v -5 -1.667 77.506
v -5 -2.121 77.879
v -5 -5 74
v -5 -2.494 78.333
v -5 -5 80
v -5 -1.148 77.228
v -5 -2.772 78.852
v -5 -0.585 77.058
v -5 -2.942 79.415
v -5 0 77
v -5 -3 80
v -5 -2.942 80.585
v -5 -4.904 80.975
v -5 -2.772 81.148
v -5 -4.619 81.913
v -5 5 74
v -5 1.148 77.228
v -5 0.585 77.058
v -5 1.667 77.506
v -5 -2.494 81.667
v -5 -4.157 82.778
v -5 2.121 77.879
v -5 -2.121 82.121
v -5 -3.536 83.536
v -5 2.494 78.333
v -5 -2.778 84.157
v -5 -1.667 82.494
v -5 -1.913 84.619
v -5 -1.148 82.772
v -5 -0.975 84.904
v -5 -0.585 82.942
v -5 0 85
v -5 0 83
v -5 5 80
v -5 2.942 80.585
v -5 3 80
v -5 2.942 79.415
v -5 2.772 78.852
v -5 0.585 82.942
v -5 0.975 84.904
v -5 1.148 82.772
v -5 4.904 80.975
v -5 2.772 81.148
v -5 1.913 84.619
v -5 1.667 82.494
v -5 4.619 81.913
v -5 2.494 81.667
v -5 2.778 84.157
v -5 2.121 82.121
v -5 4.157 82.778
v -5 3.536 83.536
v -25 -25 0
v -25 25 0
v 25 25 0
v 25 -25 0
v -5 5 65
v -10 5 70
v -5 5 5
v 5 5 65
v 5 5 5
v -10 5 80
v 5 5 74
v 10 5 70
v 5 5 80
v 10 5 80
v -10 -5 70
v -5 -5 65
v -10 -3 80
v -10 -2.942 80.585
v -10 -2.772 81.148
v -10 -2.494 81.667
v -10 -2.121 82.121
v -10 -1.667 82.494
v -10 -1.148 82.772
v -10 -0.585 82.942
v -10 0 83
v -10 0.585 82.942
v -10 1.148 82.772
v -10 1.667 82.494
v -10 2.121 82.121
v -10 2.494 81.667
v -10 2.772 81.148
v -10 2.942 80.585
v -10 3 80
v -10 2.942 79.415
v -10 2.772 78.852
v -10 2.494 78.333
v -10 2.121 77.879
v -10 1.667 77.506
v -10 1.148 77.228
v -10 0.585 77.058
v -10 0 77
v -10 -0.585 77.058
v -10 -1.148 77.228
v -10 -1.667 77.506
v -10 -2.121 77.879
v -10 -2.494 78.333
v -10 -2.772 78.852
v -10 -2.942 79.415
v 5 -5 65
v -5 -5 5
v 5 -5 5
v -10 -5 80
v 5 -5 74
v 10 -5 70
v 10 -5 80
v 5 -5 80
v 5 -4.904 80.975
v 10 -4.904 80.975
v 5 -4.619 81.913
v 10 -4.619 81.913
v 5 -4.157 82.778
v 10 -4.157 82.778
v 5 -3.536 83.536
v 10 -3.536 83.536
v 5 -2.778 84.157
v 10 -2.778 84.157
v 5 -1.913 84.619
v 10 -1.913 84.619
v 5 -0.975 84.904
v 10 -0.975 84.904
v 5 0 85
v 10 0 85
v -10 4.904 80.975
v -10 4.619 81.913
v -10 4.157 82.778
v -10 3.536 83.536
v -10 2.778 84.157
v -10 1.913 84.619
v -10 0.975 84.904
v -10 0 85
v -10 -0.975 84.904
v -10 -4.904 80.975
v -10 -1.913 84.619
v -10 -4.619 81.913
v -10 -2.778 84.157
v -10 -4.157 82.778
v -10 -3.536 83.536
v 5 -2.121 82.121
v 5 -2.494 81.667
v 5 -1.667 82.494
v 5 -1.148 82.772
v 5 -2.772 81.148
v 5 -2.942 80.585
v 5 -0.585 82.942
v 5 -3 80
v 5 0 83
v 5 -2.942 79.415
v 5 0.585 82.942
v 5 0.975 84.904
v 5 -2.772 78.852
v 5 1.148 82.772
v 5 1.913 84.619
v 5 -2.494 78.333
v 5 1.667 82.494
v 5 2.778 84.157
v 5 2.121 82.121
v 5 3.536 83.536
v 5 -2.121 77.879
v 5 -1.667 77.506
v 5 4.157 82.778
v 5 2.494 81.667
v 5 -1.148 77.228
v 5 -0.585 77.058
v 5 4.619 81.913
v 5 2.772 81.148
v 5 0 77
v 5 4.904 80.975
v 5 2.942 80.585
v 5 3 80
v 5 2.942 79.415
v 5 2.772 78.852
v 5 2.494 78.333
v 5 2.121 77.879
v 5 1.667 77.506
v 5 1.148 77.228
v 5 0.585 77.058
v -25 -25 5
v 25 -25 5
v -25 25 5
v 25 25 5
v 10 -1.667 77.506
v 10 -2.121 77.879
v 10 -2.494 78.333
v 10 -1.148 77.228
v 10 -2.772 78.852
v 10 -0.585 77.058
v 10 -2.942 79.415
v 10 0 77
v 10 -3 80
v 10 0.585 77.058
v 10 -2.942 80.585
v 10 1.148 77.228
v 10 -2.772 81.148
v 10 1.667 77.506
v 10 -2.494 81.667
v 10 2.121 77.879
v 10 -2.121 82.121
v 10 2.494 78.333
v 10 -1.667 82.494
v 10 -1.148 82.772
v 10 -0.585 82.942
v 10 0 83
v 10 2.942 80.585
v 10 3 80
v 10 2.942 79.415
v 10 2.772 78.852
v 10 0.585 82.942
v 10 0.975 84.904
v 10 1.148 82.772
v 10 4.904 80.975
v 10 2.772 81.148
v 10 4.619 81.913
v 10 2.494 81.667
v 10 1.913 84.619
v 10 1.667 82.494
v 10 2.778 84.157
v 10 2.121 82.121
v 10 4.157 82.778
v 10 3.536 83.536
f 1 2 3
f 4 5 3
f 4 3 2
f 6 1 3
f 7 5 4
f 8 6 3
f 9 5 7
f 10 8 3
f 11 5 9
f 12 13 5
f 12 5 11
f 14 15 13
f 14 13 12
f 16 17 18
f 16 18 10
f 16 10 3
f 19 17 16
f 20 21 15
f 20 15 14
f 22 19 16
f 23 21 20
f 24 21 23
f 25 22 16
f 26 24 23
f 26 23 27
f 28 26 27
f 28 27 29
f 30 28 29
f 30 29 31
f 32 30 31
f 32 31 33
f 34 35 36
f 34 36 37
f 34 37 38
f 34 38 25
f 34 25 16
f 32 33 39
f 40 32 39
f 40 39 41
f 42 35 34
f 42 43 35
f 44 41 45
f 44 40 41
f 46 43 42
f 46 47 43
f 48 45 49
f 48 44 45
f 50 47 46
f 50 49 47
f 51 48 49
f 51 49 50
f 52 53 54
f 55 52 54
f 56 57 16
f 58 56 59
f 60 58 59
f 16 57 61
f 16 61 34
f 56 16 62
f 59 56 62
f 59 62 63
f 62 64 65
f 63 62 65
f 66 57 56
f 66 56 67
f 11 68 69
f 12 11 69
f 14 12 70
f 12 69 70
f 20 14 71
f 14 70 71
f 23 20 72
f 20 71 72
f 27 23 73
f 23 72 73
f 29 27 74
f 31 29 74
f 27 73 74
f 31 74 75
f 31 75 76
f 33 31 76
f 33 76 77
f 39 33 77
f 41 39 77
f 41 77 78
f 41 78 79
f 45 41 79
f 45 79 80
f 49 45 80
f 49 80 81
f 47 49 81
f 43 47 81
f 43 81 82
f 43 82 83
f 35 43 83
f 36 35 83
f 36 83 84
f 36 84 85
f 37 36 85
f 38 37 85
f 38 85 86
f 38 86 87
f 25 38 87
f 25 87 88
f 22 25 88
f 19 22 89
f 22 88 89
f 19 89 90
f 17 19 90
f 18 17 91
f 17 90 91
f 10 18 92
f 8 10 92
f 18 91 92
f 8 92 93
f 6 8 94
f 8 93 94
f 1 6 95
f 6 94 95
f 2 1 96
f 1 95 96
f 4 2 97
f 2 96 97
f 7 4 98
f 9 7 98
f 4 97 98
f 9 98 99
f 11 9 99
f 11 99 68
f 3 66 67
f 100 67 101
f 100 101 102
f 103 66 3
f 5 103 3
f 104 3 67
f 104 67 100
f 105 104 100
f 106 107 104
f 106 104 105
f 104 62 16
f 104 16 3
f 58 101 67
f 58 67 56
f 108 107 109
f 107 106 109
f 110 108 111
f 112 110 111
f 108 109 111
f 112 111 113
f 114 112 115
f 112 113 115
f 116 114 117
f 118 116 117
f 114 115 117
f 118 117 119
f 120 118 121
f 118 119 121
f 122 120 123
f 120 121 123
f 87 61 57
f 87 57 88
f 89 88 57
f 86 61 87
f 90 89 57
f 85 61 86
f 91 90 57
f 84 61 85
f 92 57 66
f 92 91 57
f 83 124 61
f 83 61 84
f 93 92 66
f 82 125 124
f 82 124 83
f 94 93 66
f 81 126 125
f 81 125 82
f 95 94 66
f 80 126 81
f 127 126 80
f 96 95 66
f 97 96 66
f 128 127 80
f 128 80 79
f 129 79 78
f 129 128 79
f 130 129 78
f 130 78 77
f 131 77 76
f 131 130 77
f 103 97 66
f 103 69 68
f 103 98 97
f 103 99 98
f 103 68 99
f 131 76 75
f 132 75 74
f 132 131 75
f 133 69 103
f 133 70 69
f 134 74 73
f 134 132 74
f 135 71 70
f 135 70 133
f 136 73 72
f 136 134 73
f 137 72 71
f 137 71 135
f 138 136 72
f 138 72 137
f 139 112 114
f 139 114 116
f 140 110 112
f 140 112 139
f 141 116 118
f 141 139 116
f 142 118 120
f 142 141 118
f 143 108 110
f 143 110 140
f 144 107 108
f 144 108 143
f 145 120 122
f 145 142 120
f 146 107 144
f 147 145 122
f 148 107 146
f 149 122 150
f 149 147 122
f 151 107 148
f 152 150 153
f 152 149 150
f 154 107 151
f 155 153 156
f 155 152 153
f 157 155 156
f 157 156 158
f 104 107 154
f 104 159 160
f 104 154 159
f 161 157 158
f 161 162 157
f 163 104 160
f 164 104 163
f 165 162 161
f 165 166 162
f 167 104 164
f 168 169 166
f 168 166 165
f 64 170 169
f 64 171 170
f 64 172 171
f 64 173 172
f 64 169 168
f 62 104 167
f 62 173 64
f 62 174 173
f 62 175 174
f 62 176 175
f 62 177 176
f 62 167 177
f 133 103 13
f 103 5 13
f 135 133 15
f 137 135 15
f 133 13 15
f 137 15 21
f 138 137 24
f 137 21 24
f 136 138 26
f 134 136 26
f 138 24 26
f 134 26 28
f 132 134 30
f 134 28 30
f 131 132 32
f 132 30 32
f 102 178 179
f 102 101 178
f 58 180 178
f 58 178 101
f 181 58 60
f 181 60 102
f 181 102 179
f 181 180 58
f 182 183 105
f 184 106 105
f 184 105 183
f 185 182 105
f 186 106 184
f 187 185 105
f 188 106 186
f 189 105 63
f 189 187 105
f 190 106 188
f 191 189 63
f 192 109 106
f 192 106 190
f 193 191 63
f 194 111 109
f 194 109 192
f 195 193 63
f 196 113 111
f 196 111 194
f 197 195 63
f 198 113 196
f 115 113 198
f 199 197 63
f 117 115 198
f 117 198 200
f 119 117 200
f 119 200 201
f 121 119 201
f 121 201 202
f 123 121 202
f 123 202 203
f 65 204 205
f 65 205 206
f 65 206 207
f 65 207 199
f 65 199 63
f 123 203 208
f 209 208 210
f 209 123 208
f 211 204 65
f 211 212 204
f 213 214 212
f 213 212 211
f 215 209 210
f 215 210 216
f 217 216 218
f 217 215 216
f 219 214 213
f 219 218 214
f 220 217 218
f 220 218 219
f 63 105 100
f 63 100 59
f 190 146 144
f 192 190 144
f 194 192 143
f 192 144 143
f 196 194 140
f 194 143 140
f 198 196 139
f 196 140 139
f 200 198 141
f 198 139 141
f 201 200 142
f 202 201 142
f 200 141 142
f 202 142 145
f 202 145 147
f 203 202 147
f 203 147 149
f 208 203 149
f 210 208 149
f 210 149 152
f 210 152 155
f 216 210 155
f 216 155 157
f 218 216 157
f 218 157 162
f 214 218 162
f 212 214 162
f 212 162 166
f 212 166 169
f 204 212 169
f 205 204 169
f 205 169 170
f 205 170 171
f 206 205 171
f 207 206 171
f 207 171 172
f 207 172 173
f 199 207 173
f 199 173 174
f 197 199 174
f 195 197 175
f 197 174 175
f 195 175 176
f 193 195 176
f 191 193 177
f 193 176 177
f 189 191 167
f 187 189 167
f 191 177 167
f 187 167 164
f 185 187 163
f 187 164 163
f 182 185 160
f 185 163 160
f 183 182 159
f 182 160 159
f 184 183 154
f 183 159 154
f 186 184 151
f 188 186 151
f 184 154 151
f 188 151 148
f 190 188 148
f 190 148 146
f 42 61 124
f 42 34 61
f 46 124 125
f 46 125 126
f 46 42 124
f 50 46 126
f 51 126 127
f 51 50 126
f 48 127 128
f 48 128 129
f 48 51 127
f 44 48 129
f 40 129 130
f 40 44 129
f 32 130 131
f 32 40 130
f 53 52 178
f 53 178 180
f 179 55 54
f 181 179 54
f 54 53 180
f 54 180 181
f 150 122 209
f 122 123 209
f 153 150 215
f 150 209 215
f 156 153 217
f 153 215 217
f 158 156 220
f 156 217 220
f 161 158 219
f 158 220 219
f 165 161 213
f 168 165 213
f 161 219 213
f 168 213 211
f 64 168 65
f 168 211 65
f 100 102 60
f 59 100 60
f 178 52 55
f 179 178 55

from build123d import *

# Parameters (mm, degrees)
F0_W      = 50
F0_H      = 50
F0_W_2    = 10
F0_H_2    = 10
F1_DEPTH  = 5
F2_DEPTH  = 75
F3_W      = 10
F3_H      = 5
F4_DEPTH  = 5
F5_W      = 10
F5_H      = 5
F6_DEPTH  = 5
F7_W      = 5
F7_H      = 10
F8_DEPTH  = 10
F10_D     = 6
F10_DEPTH = 20.001
F12_D     = 6
F13_R     = 4.99999
F14_DEPTH = 1
F15_DEPTH = 5
F16_SIZE  = 4.99999


# Not quite as in the source:
# - a fillet or chamfer is up to 0.001 mm smaller than in the source, because OpenCascade refuses the exact size


with BuildPart() as f1:
    # F0 (on Top) → F1 (new body)
    with BuildSketch(Plane.XY):
        Rectangle(F0_W, F0_H)
        Rectangle(F0_W_2, F0_H_2, mode=Mode.SUBTRACT)
    extrude(amount=F1_DEPTH)

    # F0 (on Top) → F2 (join)
    with BuildSketch(Plane.XY):
        Rectangle(F0_W_2, F0_H_2)
    extrude(amount=F2_DEPTH)

    # F3 (on face) → F4 (join)
    with BuildSketch(Plane.YZ.offset(5)):
        with Locations((0, 72.5)):
            Rectangle(F3_W, F3_H)
    extrude(amount=F4_DEPTH)

    # F5 (on face) → F6 (join)
    with BuildSketch(Plane(origin=(-5, 0, 0), x_dir=(0, -1, 0), z_dir=(-1, 0, 0))):
        with Locations((0, 72.5)):
            Rectangle(F5_W, F5_H)
    extrude(amount=F6_DEPTH)

    # F7 (on face) → F8 (join)
    with BuildSketch(Plane.XY.offset(75)):
        with Locations((7.5, 0)):
            Rectangle(F7_W, F7_H)
        with Locations((-7.5, 0)):
            Rectangle(F7_W, F7_H)
    extrude(amount=F8_DEPTH)

    # F10 (through all, one way)
    with BuildSketch(Plane(origin=(5, 0, 0), x_dir=(0, -1, 0), z_dir=(-1, 0, 0))):
        with Locations((0, 80)):
            Circle(F10_D / 2)
    extrude(amount=-F10_DEPTH, mode=Mode.SUBTRACT)

    # F12 (through all)
    with Locations(Plane.YZ.offset(-5)):
        with Locations((0, 80)):
            Hole(F12_D / 2)

    # F13 (radius 5 in the source; OpenCascade refuses exactly that, so slightly less here)
    f13_edges = [f1.edges().sort_by_distance(p)[0] for p in [
        (-7.5, -5, 85),
        (7.5, -5, 85),
        (7.5, 5, 85),
        (-7.5, 5, 85),
    ]]
    fillet(f13_edges, radius=F13_R)

    # F14 (cut): a face of the model
    f14_faces = [f1.faces().sort_by_distance(p)[0] for p in [
        (0, 0, 75),
    ]]
    extrude(f14_faces, amount=-F14_DEPTH, mode=Mode.SUBTRACT)

    # F15 (add): faces of the model
    f15_faces = [f1.faces().sort_by_distance(p)[0] for p in [
        (7.5, 0, 70),
        (-7.5, 0, 70),
    ]]
    extrude(f15_faces, amount=F15_DEPTH)

    # F16 (size 5 in the source; OpenCascade refuses exactly that, so slightly less here)
    f16_edges = [f1.edges().sort_by_distance(p)[0] for p in [
        (10, 0, 65),
        (-10, 0, 65),
    ]]
    chamfer(f16_edges, length=F16_SIZE)


solid = f1.part
